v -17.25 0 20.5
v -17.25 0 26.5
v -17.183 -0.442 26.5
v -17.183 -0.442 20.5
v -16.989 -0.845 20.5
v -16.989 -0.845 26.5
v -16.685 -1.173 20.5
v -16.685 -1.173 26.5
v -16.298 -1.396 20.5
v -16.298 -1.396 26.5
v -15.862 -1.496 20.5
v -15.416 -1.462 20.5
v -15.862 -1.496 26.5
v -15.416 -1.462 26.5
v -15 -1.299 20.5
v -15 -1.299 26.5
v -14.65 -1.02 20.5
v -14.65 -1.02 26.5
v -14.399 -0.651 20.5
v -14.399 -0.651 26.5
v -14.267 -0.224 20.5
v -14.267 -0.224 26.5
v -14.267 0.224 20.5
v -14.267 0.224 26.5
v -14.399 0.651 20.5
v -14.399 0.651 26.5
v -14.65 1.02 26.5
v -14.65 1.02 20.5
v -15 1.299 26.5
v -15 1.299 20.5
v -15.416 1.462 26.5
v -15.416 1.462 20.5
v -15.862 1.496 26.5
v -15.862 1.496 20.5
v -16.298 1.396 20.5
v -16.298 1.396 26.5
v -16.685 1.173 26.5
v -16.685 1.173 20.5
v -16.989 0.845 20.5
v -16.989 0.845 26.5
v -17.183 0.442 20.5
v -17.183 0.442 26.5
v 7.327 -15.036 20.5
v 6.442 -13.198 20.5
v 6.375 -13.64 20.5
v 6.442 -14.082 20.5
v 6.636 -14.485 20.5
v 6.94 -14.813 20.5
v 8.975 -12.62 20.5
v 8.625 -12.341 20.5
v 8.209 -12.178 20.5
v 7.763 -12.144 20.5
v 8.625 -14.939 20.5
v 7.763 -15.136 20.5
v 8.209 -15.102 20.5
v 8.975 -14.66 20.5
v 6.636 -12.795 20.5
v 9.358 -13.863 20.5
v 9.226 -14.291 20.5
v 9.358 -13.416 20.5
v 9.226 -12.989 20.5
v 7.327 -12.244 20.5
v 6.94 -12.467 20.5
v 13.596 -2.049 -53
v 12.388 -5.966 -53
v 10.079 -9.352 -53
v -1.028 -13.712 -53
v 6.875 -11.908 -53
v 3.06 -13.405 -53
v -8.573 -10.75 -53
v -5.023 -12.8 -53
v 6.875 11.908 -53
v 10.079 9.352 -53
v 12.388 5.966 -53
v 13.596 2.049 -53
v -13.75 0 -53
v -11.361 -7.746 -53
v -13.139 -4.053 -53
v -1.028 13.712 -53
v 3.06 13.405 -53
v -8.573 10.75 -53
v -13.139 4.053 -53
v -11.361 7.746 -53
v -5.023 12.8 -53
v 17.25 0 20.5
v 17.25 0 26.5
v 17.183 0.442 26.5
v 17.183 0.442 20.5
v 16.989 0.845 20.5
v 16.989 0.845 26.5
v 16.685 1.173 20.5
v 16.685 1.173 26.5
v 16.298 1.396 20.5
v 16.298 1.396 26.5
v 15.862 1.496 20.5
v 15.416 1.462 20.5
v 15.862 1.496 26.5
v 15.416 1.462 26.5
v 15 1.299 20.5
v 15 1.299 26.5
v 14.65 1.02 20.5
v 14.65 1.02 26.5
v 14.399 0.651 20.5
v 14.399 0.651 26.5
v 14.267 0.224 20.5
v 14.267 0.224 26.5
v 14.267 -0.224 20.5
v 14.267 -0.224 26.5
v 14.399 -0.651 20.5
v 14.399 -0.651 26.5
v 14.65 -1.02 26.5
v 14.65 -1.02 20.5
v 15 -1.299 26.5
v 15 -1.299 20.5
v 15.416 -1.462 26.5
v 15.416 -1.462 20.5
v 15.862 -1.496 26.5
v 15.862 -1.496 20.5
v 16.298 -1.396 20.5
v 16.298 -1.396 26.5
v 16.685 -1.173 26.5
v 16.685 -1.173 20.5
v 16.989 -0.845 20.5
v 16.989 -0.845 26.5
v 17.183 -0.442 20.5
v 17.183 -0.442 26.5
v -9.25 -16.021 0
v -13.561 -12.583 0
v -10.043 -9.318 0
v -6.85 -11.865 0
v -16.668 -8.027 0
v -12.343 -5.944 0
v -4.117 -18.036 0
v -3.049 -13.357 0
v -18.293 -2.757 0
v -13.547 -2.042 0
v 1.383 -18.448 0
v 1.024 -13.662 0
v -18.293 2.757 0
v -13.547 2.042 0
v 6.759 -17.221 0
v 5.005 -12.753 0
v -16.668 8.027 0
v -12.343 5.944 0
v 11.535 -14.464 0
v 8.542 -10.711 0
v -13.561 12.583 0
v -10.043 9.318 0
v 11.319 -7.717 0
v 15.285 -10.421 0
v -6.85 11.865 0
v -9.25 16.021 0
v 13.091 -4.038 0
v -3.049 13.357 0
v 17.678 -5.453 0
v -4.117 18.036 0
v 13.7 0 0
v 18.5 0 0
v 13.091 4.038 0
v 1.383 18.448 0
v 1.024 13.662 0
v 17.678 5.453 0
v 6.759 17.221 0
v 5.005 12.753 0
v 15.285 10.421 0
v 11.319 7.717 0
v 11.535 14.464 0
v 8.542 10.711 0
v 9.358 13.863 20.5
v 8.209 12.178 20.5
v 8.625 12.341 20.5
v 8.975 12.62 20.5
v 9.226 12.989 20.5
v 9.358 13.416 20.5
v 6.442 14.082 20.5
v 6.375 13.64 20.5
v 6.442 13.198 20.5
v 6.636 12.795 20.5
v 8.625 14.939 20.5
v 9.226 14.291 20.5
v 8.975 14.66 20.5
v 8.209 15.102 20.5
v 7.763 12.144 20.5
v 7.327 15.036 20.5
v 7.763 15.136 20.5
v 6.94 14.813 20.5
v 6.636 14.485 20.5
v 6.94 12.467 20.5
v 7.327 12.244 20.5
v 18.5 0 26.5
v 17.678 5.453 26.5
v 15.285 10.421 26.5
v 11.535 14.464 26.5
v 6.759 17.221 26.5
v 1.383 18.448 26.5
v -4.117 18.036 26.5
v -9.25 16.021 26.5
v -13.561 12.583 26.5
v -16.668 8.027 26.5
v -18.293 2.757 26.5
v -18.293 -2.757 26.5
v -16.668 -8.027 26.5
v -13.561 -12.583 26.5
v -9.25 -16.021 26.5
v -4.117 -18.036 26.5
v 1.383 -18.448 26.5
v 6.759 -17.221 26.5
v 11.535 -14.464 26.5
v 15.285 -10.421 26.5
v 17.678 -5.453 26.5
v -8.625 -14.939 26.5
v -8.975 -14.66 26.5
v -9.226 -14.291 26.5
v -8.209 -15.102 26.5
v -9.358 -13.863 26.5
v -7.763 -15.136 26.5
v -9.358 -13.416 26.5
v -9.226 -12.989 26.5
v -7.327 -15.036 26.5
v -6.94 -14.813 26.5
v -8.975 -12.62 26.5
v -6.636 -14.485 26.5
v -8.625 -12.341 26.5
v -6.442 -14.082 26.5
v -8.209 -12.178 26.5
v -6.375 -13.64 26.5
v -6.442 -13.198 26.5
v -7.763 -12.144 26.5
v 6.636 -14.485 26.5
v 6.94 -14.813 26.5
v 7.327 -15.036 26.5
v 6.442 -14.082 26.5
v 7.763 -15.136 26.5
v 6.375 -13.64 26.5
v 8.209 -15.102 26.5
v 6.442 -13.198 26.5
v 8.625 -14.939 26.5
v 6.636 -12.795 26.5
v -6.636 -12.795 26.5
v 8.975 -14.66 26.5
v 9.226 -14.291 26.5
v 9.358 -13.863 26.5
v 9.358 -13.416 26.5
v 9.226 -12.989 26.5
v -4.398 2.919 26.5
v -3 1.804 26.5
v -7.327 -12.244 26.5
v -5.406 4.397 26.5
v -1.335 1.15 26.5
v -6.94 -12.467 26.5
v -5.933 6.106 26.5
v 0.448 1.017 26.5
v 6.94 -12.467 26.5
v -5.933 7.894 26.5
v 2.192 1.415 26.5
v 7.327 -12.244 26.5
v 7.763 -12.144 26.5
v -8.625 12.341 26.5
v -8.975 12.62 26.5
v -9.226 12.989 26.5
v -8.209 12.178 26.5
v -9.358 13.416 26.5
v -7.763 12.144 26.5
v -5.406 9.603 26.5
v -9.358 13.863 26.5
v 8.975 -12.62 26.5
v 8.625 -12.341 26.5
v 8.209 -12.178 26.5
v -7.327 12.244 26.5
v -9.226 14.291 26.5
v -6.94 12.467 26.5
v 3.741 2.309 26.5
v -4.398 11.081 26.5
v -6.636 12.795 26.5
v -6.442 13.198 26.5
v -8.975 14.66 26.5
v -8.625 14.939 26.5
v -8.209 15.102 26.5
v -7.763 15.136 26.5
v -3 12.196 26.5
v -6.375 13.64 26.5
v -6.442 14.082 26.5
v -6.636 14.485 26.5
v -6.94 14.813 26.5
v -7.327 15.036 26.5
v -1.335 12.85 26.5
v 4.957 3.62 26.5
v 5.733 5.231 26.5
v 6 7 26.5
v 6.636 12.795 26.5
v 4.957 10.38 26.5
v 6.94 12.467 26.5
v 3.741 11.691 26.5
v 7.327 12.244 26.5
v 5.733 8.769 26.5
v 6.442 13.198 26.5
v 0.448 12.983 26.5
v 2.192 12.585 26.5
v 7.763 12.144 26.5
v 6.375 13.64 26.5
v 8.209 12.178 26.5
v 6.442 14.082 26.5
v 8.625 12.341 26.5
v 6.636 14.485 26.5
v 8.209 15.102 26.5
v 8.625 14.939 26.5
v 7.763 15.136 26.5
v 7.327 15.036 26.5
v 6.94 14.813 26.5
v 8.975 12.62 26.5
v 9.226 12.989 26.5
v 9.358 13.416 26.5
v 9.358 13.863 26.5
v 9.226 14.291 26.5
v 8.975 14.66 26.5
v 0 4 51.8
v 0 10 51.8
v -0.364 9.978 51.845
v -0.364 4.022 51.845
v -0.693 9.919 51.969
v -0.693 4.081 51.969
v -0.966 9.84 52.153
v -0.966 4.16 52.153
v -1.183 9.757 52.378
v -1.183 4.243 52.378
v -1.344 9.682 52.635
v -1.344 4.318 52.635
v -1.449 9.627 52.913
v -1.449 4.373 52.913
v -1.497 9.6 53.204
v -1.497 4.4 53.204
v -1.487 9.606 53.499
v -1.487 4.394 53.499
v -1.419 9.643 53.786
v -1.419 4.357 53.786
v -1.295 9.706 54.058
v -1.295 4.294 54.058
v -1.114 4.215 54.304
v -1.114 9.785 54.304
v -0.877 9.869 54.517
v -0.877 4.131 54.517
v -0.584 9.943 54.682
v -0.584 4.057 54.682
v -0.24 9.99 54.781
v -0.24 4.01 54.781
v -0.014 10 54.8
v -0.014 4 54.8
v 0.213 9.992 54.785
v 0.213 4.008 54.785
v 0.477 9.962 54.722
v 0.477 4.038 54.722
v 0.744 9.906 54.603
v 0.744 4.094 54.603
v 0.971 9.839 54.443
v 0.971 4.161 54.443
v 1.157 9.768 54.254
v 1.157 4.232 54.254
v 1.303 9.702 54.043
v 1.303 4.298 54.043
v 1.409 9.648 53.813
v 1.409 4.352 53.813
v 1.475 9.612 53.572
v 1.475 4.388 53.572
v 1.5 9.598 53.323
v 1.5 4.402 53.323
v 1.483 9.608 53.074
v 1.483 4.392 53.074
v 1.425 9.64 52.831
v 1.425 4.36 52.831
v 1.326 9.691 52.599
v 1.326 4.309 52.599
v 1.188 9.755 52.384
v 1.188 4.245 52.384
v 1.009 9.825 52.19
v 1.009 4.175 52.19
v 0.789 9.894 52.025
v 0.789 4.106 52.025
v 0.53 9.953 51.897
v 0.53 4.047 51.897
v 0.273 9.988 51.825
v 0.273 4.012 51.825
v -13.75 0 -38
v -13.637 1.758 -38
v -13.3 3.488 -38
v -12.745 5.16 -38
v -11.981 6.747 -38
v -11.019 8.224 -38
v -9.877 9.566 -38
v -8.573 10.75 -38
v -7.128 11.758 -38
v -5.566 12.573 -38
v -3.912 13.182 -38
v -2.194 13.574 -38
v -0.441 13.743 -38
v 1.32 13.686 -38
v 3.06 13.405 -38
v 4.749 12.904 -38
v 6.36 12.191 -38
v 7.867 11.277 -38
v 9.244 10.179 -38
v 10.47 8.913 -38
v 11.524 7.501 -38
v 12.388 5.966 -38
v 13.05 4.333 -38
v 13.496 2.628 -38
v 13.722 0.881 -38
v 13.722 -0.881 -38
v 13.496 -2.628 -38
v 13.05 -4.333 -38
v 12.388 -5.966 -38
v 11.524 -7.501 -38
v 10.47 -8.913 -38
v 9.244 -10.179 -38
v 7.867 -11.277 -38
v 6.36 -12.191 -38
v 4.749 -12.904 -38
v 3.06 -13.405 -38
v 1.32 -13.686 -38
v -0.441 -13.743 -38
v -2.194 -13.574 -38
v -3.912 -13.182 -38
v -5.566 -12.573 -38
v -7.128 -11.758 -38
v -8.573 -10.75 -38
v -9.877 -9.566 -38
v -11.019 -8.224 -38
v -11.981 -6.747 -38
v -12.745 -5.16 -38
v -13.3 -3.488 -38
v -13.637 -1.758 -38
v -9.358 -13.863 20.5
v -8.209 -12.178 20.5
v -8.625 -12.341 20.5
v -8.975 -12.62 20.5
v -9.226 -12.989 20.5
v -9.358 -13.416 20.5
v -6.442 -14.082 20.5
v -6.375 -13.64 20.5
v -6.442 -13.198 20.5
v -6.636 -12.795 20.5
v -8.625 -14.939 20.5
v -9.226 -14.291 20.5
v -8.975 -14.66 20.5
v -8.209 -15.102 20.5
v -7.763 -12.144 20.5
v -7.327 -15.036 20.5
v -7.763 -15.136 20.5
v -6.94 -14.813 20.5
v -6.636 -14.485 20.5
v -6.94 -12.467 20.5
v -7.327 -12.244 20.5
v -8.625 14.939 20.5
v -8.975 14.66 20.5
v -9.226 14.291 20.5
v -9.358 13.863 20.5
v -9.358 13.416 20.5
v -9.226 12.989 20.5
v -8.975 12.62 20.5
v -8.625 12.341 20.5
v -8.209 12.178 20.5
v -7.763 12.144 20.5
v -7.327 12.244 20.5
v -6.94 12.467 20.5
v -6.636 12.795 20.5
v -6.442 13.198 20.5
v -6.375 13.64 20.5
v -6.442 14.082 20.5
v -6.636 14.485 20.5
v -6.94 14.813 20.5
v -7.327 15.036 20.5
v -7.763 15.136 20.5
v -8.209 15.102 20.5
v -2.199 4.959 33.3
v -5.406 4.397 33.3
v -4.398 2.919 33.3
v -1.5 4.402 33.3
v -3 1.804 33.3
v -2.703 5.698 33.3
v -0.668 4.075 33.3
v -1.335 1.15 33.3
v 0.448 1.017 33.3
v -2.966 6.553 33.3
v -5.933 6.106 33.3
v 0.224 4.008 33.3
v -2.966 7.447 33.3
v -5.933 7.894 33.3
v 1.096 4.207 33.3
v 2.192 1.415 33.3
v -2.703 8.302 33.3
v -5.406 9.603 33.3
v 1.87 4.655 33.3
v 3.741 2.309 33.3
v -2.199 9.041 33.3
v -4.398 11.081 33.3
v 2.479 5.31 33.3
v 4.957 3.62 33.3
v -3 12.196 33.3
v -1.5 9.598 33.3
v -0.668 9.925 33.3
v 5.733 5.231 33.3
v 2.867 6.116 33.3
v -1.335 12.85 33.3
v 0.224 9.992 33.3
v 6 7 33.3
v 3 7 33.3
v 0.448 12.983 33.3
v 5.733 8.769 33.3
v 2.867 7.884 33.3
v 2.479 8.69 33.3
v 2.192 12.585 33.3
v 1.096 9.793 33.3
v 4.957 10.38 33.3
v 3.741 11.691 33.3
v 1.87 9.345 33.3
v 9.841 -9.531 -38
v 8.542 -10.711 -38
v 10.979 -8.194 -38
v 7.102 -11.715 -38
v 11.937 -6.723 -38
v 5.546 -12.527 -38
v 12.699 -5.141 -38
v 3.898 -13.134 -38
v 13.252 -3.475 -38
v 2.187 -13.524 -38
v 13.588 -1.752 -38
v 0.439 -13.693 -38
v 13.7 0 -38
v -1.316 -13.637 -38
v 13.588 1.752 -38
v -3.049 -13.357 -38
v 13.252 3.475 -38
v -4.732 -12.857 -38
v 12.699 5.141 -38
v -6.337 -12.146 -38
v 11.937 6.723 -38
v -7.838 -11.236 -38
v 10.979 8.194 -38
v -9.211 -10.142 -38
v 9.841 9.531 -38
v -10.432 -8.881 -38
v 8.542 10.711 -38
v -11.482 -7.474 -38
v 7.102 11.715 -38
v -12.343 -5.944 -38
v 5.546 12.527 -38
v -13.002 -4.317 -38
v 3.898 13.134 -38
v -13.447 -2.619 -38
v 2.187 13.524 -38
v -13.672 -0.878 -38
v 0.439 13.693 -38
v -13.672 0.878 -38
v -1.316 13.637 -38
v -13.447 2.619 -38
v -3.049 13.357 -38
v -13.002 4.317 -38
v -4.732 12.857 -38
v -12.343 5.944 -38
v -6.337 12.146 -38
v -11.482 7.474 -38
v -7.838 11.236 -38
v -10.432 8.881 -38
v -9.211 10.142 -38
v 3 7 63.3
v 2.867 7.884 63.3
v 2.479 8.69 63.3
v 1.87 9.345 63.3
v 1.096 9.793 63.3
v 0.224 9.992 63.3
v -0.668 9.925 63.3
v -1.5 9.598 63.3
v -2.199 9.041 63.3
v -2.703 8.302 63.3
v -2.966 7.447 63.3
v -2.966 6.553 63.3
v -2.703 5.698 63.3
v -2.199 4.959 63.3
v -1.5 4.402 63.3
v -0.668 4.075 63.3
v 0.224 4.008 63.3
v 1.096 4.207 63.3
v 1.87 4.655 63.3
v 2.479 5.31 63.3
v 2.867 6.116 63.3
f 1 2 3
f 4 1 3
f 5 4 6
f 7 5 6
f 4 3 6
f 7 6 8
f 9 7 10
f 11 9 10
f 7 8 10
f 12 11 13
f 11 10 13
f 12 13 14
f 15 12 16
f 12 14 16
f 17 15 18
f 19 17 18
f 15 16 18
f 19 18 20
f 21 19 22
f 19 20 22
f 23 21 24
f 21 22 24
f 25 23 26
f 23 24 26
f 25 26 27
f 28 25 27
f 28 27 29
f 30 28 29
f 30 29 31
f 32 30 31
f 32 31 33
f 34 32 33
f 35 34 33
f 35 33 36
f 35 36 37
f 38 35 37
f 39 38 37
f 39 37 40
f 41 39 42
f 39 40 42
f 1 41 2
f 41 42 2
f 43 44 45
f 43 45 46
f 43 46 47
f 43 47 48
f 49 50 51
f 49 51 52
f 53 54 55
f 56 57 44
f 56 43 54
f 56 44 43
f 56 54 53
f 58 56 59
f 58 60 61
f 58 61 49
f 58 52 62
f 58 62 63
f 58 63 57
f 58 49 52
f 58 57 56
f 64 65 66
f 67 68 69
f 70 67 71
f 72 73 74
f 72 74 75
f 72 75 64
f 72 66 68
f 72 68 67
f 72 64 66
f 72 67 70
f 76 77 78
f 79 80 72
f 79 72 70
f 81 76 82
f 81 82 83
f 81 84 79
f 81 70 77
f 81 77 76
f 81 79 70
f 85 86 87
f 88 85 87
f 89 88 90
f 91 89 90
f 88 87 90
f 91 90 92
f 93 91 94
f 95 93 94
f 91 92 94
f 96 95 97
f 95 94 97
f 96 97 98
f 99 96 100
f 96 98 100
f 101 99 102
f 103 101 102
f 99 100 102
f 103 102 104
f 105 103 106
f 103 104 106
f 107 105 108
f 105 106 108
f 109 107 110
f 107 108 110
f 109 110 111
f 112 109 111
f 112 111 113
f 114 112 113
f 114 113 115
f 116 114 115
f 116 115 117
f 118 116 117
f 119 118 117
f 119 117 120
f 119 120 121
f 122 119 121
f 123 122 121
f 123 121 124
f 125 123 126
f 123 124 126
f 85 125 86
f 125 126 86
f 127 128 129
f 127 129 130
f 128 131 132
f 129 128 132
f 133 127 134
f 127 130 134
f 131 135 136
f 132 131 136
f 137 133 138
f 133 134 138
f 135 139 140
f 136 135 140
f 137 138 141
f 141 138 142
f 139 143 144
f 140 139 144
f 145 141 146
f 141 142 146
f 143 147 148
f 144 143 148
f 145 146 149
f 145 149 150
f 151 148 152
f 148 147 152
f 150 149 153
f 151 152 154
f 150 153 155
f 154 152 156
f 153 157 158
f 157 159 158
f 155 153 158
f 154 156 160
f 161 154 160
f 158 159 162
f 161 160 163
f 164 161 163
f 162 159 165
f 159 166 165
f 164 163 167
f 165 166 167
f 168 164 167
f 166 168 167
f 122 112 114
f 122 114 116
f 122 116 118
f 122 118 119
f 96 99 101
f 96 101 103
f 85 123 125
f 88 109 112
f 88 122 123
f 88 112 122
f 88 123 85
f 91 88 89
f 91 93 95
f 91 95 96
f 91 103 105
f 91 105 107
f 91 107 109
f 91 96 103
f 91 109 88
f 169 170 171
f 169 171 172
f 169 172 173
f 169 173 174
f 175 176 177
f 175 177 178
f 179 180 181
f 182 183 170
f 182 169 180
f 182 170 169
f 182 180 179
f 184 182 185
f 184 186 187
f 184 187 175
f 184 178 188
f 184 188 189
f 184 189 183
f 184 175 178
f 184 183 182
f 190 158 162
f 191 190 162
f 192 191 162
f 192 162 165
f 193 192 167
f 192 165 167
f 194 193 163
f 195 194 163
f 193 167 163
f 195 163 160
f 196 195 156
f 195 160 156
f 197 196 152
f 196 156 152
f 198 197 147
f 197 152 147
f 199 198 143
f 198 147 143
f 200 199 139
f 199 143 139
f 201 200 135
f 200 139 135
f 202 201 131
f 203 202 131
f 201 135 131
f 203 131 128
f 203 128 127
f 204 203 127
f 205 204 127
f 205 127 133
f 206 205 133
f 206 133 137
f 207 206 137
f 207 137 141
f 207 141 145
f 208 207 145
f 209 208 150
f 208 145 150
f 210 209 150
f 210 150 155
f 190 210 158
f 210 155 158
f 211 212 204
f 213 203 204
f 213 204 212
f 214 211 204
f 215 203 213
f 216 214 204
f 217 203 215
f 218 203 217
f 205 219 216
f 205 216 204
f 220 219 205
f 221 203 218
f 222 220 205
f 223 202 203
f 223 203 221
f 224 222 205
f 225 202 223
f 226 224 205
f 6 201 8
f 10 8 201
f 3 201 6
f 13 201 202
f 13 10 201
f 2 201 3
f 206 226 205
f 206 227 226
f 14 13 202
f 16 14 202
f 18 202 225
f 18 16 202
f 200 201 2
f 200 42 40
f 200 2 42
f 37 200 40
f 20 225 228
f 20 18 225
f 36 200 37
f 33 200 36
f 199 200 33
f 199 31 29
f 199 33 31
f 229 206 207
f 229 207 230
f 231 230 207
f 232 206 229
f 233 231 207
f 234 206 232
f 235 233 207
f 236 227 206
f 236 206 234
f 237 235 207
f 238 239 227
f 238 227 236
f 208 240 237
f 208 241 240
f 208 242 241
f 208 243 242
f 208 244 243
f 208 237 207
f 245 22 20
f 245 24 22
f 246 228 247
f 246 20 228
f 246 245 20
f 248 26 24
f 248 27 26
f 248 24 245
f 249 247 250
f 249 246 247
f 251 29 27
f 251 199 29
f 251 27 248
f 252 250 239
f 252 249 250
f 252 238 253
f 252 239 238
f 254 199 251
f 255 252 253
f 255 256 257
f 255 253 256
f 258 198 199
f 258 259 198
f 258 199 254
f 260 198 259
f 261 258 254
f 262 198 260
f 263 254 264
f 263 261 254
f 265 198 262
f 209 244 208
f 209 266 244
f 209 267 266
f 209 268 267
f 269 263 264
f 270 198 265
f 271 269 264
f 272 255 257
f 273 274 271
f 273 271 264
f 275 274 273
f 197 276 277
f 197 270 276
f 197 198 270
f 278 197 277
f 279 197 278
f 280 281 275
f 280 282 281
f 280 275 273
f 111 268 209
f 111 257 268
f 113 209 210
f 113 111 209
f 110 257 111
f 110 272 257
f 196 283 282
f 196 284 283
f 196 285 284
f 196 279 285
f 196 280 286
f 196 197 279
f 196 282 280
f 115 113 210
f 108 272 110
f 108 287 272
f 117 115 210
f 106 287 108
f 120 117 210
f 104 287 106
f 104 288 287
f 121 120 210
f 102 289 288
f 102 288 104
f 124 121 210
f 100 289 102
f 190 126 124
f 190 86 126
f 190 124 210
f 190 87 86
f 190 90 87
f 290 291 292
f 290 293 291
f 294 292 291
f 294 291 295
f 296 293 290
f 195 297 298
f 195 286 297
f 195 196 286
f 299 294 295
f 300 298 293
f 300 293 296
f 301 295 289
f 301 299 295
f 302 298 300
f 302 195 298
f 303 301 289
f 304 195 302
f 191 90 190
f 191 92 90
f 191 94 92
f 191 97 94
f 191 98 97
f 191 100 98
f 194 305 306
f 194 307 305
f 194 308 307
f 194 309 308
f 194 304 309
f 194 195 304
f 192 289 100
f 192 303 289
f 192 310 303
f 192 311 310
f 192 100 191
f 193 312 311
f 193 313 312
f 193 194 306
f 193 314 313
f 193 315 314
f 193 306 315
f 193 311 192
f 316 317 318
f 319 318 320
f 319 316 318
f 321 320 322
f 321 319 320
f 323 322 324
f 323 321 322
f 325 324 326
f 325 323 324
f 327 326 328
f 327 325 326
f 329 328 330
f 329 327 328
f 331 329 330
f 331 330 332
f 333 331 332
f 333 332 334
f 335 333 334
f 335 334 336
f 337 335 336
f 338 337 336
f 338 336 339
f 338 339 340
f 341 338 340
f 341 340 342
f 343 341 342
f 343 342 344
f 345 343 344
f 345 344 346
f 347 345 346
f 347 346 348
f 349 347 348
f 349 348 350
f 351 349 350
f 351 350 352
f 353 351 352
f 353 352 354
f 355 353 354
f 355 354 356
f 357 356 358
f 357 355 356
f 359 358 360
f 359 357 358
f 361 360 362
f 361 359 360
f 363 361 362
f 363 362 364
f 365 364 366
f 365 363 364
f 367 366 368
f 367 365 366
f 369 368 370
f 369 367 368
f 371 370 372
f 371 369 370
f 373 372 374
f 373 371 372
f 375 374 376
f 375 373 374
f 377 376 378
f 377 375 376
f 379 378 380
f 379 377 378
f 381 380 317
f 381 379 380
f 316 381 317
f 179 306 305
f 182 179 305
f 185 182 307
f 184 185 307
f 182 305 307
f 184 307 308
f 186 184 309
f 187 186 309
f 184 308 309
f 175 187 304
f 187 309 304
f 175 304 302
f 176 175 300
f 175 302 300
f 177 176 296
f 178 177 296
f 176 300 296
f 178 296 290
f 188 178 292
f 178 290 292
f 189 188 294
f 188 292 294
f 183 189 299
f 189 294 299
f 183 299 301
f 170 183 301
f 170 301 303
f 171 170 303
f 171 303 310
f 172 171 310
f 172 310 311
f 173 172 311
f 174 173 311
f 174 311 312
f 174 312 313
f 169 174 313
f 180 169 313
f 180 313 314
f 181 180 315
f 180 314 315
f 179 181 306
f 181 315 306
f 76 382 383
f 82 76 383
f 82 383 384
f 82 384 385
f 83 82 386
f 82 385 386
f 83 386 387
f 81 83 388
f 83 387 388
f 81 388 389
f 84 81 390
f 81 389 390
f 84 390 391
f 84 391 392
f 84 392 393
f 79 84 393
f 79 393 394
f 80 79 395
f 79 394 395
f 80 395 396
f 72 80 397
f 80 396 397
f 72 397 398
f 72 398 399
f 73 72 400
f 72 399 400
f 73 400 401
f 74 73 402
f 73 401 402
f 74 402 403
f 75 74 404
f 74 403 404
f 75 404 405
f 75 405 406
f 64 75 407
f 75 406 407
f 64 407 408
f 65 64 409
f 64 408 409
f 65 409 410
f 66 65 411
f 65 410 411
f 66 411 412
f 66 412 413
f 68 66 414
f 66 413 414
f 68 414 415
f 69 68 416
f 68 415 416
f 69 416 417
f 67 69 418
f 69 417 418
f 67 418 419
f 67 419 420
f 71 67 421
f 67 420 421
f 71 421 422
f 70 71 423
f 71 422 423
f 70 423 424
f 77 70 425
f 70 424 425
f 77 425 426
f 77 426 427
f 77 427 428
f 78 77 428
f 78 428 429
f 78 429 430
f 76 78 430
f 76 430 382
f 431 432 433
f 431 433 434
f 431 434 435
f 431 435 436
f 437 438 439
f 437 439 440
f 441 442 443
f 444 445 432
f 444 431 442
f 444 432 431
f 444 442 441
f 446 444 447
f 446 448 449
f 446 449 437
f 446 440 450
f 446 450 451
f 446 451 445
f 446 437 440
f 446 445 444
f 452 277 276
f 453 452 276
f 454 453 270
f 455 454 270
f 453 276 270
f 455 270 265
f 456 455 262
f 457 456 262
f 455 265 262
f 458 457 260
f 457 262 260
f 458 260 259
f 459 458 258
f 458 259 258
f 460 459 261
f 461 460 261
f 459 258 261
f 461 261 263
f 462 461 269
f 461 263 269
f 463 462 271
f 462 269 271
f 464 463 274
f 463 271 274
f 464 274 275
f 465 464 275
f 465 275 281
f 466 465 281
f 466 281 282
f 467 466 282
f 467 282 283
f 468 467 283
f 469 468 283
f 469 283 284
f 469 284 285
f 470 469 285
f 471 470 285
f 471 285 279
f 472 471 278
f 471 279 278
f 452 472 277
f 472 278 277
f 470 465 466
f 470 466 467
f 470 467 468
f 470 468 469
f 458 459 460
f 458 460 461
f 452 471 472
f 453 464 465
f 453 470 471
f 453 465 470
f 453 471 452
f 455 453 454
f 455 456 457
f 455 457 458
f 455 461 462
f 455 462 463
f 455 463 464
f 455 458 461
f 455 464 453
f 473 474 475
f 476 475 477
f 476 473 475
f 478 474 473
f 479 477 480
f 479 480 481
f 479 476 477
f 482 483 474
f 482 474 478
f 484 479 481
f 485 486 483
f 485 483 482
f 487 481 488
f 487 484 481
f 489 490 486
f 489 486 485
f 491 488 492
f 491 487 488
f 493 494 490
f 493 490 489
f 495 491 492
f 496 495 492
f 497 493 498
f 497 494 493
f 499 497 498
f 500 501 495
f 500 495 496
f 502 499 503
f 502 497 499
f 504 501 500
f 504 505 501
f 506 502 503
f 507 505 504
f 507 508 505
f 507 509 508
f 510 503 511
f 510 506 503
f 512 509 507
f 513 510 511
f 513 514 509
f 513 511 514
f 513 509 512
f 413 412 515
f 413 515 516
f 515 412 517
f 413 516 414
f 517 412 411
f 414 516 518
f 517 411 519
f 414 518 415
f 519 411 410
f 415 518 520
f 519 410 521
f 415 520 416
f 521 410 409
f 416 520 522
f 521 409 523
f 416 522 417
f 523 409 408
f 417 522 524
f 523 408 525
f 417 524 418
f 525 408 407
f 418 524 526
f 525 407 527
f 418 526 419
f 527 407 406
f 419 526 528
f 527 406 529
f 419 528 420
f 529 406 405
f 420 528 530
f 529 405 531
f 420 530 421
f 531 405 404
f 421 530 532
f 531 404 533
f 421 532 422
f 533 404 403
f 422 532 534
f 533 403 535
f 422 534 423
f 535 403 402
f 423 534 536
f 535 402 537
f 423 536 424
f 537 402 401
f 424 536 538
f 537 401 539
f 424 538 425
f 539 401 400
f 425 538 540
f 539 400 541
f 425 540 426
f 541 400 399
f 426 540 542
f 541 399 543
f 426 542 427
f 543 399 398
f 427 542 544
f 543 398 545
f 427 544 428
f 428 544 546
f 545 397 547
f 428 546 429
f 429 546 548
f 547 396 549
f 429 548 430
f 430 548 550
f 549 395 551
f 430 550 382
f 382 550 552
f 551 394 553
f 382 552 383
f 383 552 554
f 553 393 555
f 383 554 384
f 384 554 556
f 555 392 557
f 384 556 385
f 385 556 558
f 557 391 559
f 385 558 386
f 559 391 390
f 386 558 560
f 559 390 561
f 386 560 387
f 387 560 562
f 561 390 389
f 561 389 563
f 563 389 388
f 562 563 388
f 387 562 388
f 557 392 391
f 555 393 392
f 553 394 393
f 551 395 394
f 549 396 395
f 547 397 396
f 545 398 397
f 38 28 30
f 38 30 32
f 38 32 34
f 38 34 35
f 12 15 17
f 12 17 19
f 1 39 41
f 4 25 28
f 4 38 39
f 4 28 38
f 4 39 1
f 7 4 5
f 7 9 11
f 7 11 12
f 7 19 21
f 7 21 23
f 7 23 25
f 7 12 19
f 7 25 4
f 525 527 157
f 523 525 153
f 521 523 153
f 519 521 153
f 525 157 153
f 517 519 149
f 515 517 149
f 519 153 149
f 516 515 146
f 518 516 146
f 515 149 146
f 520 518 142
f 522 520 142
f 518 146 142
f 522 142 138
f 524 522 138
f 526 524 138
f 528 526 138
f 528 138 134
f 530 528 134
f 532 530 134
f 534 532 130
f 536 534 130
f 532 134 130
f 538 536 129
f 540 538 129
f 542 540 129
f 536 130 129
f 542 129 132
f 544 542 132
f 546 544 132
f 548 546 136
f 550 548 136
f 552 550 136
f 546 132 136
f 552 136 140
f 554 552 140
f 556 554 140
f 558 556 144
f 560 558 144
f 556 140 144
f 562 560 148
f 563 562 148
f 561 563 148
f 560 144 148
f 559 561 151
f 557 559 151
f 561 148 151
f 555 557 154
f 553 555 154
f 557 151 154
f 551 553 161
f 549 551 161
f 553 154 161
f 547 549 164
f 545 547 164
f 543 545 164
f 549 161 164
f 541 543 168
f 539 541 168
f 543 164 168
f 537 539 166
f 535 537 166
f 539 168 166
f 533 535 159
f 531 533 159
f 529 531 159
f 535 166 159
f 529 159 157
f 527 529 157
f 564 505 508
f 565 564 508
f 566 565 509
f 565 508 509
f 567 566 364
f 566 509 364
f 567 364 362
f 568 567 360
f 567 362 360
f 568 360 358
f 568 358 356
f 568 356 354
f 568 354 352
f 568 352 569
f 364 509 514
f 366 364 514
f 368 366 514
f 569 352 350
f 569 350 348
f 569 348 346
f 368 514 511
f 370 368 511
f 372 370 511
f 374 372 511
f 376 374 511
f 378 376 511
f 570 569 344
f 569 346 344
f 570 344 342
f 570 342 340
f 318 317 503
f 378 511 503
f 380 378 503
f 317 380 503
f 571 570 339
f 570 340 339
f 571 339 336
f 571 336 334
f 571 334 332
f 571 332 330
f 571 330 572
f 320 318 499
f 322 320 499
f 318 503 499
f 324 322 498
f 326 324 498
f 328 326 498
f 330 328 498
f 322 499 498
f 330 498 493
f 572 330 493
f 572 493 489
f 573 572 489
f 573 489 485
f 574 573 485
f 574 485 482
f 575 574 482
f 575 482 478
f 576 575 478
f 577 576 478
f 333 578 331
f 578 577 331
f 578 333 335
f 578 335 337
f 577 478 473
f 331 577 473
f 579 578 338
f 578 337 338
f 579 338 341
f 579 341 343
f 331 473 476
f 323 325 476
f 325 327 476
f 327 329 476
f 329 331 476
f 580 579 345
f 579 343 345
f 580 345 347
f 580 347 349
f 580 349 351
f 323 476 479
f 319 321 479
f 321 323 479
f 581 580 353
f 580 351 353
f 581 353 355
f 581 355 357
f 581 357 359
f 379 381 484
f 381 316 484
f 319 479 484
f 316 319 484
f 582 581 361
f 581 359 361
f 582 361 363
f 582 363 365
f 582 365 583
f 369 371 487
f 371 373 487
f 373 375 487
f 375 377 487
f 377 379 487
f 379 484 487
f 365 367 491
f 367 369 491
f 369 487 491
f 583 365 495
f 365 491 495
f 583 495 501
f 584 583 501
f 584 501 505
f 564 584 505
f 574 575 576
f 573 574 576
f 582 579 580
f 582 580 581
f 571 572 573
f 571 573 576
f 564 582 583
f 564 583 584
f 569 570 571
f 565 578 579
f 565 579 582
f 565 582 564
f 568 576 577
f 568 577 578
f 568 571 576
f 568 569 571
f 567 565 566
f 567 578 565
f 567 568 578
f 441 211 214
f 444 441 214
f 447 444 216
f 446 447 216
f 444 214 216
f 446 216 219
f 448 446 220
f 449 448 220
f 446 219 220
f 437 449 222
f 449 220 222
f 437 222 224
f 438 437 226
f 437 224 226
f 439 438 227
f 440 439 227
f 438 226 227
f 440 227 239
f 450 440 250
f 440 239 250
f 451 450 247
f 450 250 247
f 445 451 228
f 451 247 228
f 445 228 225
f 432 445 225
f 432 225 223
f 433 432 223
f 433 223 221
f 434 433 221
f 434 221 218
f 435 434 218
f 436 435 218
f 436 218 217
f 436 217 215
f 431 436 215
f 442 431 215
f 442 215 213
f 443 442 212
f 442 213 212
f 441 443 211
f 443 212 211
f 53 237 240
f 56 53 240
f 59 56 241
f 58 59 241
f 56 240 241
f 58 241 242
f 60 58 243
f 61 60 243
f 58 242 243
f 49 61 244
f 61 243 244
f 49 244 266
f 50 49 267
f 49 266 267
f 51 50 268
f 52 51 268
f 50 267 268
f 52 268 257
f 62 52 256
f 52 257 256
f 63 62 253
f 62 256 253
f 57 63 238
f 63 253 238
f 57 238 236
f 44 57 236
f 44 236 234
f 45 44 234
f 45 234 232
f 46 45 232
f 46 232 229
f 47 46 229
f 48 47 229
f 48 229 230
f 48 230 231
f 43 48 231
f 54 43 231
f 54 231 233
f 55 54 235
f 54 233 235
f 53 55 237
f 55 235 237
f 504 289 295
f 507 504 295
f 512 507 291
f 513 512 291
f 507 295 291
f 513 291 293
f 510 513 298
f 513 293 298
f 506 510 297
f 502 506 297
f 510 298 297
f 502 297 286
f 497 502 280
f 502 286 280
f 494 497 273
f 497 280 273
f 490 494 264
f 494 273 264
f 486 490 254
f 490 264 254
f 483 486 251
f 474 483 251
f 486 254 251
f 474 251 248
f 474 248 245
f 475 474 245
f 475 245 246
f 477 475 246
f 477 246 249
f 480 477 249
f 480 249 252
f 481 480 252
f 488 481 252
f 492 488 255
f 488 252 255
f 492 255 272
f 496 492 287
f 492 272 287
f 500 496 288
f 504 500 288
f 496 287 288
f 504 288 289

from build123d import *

# Parameters (mm, degrees)
SKETCH1_R           = 18.5
BOSS_EXTRUDE1_DEPTH = 26.5
SKETCH2_R           = 13.7
BOSS_EXTRUDE2_DEPTH = 38
SKETCH3_R           = 6
BOSS_EXTRUDE3_DEPTH = 6.8
SKETCH4_R           = 3
BOSS_EXTRUDE4_DEPTH = 30
SKETCH5_R           = 1.5
CUT_EXTRUDE1_DEPTH  = 6
CIRPATTERN1_COUNT   = 6
SKETCH6_R           = 13.75
BOSS_EXTRUDE5_DEPTH = 15
SKETCH7_R           = 1.5
CUT_EXTRUDE2_DEPTH  = 69.49372234


with BuildPart() as part:
    # Sketch1 → Boss-Extrude1 (new body)
    with BuildSketch(Plane.XY):
        Circle(SKETCH1_R)
    extrude(amount=BOSS_EXTRUDE1_DEPTH)

    # Sketch2 → Boss-Extrude2 (add)
    with BuildSketch(Plane(origin=(0, 0, 0), x_dir=(-1, 0, 0), z_dir=(0, 0, -1))):
        with Locations(Location((0, 0, 0), (0, 0, 180))):
            Circle(SKETCH2_R)
    extrude(amount=BOSS_EXTRUDE2_DEPTH)

    # Sketch3 → Boss-Extrude3 (add)
    with BuildSketch(Plane.XY.offset(26.5)):
        with Locations((0, 7)):
            Circle(SKETCH3_R)
    extrude(amount=BOSS_EXTRUDE3_DEPTH)

    # Sketch4 → Boss-Extrude4 (add)
    with BuildSketch(Plane.XY.offset(33.3)):
        with Locations((0, 7)):
            Circle(SKETCH4_R)
    extrude(amount=BOSS_EXTRUDE4_DEPTH)

    # Sketch5 → Cut-Extrude1 (cut)
    with BuildSketch(Plane.XY.offset(26.5)):
        with Locations((15.75, 0)):
            Circle(SKETCH5_R)
    cut_extrude1 = extrude(amount=-CUT_EXTRUDE1_DEPTH, mode=Mode.SUBTRACT)

    # CirPattern1: Cut-Extrude1 ×6 about axis
    cirpattern1_axis = Axis((0, 0, 0), (0, 0, 1))
    for i in range(1, CIRPATTERN1_COUNT):
        add(cut_extrude1.rotate(cirpattern1_axis, i * 360 / CIRPATTERN1_COUNT), mode=Mode.SUBTRACT)

    # Sketch6 → Boss-Extrude5 (add)
    with BuildSketch(Plane(origin=(0, 0, -38), x_dir=(-1, 0, 0), z_dir=(0, 0, -1))):
        Circle(SKETCH6_R)
    extrude(amount=BOSS_EXTRUDE5_DEPTH)

    # Sketch7 → Cut-Extrude2 (cut, through all)
    with BuildSketch(Plane(origin=(0, 0, 0), x_dir=(1, 0, 0), z_dir=(0, 1, 0))):
        with Locations(Location((0, -53.3, 0), (0, 0, 90))):
            Circle(SKETCH7_R)
    extrude(amount=CUT_EXTRUDE2_DEPTH, mode=Mode.SUBTRACT)


solid = part.part
